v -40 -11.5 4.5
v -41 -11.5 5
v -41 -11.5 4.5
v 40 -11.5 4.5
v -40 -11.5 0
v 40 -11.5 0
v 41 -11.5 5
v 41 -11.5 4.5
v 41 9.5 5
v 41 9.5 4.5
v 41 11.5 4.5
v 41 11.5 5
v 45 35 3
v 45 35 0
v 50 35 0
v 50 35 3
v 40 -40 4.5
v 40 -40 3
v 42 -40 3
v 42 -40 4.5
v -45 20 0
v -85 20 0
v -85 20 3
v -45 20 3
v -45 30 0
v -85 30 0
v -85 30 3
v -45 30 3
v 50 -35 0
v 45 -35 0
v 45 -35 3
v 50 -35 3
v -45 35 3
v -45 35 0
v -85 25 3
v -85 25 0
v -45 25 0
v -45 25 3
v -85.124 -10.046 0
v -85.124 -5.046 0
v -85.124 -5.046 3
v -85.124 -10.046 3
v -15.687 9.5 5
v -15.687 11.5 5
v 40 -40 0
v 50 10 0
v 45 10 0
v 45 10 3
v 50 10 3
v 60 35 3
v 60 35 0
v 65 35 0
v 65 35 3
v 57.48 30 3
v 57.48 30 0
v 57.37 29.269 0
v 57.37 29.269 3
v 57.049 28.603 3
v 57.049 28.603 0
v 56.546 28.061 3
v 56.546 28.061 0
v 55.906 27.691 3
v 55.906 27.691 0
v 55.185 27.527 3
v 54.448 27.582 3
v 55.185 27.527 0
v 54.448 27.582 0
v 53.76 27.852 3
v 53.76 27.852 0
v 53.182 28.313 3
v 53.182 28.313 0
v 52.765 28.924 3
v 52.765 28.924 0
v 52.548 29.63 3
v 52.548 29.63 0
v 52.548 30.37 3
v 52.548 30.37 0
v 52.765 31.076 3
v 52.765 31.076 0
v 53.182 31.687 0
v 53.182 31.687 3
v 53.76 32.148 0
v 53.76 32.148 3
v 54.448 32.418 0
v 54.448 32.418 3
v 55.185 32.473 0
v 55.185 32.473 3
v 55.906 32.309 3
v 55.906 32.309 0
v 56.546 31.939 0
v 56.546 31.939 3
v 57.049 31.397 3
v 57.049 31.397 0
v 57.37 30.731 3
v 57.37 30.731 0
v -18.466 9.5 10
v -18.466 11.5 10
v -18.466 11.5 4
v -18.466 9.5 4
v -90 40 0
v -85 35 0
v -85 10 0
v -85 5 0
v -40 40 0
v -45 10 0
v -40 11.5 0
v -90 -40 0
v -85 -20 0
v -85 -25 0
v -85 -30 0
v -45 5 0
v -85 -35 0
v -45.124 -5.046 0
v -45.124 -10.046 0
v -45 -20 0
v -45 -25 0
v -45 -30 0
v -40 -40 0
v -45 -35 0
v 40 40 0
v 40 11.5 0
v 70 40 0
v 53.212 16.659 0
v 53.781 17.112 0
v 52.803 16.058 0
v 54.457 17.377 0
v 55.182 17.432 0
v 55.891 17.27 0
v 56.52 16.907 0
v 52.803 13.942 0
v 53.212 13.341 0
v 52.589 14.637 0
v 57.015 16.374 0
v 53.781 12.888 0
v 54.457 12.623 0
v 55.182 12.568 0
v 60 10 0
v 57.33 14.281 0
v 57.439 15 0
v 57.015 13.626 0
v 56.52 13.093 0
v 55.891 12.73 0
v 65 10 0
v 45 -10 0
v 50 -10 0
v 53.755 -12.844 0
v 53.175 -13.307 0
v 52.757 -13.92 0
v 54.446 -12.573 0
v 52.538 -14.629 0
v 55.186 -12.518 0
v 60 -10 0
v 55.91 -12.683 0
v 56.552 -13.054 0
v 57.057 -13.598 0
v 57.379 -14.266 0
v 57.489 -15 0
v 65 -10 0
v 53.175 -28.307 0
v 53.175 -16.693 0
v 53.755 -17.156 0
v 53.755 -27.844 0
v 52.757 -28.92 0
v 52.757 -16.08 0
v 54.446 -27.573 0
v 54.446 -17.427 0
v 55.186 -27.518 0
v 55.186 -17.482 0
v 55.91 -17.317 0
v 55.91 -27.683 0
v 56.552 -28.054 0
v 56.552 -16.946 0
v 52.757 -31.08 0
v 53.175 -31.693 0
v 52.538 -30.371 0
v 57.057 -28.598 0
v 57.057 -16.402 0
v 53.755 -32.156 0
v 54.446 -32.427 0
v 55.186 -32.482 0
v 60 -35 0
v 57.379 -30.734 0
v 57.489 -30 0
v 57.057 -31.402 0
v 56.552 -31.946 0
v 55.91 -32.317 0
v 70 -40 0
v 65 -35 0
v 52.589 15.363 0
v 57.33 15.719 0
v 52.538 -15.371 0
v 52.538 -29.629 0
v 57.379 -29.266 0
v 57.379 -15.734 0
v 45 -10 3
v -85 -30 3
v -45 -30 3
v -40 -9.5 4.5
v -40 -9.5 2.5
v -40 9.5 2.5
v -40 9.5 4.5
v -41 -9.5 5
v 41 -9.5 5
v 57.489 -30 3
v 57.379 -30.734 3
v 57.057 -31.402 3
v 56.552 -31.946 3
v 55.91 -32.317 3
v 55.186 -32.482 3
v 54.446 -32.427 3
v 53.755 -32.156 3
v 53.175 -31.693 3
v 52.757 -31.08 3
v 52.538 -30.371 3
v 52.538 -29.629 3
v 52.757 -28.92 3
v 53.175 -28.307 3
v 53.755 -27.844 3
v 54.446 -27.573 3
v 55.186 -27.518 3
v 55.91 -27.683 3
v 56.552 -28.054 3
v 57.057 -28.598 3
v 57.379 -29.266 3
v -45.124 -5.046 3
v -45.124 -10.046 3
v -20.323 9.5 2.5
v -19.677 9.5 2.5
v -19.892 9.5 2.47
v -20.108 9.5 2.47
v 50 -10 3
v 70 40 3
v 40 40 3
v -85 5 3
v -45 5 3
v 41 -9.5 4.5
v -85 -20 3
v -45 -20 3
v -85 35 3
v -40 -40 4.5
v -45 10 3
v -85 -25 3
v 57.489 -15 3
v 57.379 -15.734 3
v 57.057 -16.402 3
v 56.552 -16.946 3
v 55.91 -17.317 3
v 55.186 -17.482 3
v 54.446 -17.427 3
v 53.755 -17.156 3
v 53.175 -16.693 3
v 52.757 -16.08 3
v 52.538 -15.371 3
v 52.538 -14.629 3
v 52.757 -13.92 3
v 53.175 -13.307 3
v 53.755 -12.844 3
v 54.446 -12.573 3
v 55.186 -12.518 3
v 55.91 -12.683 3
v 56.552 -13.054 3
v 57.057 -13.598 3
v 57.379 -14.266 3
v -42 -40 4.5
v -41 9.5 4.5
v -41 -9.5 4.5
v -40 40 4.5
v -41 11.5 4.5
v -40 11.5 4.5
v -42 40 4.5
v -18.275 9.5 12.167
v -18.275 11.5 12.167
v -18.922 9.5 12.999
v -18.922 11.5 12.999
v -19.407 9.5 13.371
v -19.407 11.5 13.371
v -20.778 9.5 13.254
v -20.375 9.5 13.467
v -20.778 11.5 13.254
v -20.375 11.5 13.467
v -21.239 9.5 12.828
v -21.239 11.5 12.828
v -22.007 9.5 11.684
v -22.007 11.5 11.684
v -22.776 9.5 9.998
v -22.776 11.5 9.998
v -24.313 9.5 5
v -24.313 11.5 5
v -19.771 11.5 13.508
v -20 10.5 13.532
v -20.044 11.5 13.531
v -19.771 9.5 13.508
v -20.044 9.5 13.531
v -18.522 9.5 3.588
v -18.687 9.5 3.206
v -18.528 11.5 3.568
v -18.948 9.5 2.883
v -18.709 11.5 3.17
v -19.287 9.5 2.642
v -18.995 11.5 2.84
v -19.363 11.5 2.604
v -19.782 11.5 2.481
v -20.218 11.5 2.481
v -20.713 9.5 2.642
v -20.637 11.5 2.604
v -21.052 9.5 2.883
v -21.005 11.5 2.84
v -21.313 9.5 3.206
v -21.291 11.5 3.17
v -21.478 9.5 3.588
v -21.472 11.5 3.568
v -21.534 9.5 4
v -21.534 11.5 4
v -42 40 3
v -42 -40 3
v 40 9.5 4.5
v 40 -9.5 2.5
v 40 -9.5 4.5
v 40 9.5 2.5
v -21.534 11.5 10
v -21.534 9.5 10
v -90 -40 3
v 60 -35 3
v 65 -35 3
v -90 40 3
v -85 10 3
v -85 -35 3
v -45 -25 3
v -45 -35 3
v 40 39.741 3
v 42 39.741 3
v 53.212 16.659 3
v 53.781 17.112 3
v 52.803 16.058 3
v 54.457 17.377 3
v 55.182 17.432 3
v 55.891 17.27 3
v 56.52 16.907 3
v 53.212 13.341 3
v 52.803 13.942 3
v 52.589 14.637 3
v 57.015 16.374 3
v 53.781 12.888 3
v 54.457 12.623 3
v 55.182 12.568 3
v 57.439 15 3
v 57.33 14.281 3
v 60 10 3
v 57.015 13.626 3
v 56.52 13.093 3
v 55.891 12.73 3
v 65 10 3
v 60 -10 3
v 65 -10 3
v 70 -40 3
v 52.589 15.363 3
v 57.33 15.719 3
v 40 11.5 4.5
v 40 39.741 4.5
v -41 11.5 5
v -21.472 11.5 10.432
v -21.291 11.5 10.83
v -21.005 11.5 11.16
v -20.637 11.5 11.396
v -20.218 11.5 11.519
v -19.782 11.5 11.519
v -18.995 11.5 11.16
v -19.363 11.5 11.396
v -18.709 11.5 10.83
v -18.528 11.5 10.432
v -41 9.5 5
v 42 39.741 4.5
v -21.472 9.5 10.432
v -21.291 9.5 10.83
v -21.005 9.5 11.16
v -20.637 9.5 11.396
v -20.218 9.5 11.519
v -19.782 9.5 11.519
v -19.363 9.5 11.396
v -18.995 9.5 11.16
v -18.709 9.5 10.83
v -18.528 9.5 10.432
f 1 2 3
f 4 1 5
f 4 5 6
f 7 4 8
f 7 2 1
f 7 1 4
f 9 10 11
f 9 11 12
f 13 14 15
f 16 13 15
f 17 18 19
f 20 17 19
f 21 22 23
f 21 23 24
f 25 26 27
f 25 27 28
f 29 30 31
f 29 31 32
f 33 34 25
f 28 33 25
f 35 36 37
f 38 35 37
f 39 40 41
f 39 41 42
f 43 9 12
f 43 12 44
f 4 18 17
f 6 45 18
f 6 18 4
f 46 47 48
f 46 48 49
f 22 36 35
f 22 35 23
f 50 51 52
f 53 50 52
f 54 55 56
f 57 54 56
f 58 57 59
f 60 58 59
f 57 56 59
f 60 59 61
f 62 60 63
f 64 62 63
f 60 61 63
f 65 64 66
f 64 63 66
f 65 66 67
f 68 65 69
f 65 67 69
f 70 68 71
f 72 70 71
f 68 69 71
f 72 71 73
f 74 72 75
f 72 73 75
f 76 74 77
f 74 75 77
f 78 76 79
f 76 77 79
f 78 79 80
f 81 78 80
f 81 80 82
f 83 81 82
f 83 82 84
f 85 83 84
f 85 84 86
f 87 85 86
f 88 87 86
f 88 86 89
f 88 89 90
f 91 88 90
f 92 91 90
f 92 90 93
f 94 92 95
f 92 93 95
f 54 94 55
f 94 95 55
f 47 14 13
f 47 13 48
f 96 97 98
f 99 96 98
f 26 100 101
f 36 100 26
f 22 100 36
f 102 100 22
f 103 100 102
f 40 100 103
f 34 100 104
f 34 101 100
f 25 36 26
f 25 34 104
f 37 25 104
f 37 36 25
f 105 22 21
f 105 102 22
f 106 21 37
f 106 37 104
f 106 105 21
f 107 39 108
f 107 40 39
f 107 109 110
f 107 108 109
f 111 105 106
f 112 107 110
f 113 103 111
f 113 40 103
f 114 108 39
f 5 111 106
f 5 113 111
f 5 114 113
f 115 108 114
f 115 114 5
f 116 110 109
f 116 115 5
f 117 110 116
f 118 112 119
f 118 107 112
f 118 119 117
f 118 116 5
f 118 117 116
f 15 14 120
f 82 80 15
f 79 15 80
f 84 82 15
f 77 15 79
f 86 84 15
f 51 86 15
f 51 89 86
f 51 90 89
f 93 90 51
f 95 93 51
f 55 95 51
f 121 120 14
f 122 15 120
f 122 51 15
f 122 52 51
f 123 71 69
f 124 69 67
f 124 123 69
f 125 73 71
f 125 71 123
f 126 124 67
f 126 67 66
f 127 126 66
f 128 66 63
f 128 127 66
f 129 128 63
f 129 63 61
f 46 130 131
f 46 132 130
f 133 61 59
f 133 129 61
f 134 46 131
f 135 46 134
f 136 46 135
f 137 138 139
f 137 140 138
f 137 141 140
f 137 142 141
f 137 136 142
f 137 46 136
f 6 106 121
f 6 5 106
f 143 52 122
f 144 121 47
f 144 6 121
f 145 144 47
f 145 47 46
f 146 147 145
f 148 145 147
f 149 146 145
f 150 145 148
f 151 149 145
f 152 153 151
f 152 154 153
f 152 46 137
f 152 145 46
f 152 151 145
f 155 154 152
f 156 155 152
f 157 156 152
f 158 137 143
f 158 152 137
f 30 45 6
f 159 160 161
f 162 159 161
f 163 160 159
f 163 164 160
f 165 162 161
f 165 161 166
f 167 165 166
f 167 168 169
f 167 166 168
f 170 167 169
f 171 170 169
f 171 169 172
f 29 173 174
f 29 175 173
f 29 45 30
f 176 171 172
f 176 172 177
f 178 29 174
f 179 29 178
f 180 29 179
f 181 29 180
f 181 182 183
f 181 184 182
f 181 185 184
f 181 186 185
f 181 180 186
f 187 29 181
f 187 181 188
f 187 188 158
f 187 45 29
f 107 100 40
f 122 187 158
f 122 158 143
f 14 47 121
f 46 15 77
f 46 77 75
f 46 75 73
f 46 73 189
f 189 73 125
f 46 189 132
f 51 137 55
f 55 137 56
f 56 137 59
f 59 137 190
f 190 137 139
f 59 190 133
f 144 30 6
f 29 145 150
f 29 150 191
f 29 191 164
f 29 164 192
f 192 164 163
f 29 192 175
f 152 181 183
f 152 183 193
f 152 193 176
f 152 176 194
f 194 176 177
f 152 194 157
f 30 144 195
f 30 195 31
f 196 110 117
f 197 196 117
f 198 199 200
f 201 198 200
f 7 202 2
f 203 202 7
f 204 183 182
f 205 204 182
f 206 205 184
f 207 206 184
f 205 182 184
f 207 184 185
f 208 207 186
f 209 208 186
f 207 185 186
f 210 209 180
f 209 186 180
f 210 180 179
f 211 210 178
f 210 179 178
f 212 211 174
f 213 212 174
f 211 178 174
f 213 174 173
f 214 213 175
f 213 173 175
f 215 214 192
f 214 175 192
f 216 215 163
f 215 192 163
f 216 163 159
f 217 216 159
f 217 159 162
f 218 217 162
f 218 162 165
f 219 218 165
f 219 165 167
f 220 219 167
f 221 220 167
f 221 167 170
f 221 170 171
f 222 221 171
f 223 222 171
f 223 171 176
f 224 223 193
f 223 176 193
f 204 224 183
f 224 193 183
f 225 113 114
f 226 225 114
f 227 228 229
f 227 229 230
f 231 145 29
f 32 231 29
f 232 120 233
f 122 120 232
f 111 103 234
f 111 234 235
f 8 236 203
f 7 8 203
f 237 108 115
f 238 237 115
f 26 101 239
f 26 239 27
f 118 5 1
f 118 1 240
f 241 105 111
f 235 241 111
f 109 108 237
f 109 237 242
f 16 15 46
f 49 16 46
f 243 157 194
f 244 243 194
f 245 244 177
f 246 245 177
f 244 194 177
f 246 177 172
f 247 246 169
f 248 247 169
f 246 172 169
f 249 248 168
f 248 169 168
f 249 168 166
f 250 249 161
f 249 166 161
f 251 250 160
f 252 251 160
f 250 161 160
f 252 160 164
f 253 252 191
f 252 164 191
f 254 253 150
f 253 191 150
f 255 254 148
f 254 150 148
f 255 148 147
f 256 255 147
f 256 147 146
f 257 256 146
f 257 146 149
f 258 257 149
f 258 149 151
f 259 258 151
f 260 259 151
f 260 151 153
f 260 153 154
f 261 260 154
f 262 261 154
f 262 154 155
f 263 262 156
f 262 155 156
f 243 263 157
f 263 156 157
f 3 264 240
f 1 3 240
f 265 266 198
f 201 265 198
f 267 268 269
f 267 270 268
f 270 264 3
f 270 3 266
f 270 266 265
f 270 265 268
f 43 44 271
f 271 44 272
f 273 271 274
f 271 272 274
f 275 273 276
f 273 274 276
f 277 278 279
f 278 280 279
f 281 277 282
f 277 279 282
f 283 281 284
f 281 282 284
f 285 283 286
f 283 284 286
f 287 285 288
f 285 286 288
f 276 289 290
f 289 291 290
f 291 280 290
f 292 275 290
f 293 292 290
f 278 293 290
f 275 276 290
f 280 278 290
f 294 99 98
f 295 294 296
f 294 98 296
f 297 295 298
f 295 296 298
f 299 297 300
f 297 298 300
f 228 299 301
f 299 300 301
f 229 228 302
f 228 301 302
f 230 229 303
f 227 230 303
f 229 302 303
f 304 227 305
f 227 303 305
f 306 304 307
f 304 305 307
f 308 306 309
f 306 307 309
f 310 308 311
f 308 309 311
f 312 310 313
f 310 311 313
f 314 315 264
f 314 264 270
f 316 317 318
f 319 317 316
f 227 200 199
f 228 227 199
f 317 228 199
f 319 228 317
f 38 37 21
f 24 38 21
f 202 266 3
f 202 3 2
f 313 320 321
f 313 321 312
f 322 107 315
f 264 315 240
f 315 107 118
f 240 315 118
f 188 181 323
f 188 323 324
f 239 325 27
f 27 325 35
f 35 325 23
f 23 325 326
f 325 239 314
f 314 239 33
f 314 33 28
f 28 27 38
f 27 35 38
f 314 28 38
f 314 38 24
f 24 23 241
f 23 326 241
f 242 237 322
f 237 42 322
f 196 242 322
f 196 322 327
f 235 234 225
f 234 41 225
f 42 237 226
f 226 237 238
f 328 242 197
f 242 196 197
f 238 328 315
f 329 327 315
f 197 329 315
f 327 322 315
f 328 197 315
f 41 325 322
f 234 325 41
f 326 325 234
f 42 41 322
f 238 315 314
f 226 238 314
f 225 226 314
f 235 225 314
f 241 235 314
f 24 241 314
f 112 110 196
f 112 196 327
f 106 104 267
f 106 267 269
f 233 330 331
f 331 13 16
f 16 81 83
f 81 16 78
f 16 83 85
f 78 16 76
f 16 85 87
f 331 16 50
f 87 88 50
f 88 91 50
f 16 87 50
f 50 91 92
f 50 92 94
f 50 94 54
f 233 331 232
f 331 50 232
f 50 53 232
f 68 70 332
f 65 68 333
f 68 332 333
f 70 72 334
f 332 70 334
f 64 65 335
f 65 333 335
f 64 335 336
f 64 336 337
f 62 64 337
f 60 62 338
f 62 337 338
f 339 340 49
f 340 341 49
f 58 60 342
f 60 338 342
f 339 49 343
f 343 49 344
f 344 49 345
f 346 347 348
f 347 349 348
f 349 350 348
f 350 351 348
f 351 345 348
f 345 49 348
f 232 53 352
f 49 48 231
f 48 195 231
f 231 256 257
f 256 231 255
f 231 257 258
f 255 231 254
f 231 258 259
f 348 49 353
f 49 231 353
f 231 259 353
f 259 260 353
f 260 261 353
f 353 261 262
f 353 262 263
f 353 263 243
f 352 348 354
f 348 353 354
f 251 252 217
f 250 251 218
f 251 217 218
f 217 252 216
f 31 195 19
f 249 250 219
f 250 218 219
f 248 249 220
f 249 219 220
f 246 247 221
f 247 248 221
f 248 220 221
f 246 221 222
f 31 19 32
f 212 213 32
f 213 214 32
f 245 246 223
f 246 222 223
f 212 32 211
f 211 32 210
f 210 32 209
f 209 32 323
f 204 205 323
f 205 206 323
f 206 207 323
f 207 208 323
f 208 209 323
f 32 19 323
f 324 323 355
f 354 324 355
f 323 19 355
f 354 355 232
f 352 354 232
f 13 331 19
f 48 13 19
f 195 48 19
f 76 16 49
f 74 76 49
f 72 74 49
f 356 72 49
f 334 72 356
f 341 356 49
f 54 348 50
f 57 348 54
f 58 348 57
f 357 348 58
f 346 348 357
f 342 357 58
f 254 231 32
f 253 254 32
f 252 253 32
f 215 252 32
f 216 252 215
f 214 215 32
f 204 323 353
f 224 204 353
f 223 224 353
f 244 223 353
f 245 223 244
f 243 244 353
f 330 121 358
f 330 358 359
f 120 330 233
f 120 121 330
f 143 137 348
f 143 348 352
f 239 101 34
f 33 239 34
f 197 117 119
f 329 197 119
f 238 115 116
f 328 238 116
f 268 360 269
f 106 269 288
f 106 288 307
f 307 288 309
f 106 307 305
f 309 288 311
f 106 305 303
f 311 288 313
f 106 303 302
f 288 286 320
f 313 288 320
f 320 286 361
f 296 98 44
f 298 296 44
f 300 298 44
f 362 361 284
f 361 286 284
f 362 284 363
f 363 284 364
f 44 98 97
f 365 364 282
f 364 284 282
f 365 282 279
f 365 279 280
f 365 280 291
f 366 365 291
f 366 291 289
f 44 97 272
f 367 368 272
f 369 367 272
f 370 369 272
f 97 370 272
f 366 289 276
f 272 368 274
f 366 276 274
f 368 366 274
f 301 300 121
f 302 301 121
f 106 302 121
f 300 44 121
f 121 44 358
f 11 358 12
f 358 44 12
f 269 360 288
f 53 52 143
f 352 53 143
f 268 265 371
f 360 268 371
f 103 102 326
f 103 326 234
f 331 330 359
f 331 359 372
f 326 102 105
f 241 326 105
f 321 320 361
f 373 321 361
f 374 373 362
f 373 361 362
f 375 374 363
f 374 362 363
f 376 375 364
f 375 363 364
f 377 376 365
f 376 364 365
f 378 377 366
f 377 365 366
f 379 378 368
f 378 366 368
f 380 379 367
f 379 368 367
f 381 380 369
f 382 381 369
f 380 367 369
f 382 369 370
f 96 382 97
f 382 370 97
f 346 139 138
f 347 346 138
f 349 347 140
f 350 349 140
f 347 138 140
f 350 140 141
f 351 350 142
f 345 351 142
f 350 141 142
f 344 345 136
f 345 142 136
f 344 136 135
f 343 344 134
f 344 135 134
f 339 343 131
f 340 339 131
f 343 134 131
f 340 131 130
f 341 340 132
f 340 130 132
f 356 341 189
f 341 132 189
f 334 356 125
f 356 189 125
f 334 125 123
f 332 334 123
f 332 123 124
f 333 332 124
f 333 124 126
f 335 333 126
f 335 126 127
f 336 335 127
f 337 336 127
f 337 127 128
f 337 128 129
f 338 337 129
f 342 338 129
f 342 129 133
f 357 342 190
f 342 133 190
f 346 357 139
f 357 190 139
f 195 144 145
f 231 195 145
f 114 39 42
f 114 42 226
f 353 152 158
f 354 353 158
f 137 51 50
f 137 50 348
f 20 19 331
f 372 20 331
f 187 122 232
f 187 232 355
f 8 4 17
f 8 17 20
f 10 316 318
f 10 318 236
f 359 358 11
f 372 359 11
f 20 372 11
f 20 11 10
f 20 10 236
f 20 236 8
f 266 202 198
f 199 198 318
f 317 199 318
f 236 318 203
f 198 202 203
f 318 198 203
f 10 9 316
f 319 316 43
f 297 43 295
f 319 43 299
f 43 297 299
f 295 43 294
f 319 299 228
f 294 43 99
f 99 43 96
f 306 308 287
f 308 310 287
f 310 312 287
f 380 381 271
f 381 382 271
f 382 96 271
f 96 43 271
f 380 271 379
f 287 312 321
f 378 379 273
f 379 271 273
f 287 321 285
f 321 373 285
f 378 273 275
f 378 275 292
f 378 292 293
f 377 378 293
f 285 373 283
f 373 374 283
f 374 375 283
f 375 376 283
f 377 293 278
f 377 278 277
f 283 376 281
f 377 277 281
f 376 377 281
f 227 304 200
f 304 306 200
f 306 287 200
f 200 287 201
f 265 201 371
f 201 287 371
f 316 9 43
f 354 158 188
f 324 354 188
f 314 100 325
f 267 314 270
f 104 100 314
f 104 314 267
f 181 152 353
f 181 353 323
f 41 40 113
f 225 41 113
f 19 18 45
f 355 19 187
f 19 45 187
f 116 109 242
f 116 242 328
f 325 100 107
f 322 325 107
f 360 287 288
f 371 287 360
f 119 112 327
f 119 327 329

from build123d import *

# Parameters (mm, degrees)
SKETCH_W        = 81
SKETCH_H        = 19
PAD_DEPTH       = 2.5
SKETCH001_W     = 82
SKETCH001_H     = 5
PAD001_DEPTH    = 2
SKETCH002_W     = 82
SKETCH002_H     = 5
PAD002_DEPTH    = 2
PAD003_DEPTH    = 2
POCKET_DEPTH    = 2
SKETCH005_W     = 50
SKETCH005_H     = 80
SKETCH005_W_2   = 30
PAD004_DEPTH    = 3
SKETCH006_R     = 2.48011
SKETCH006_R_2   = 2.438602
SKETCH006_R_3   = 2.48946
SKETCH006_W     = 5
SKETCH006_H     = 25
POCKET001_DEPTH = 3
SKETCH007_W     = 40
SKETCH007_H     = 5
POCKET002_DEPTH = 5
SKETCH008_W     = 2
SKETCH008_H     = 79.741493
SKETCH008_H_2   = 80
PAD005_DEPTH    = 1.5


with BuildPart() as part:
    # Sketch → Pad (new body)
    with BuildSketch(Plane.XY):
        Rectangle(SKETCH_W, SKETCH_H)
    extrude(amount=PAD_DEPTH)

    # Sketch001 (on Face3 of Pad) → Pad001 (join)
    with BuildSketch(Plane.XZ.offset(9.5)):
        with Locations((0, 2.5)):
            Rectangle(SKETCH001_W, SKETCH001_H)
    extrude(amount=PAD001_DEPTH)

    # Sketch002 (on Face11 of Pad001) → Pad002 (join)
    with BuildSketch(Plane(origin=(0, 9.5, 0), x_dir=(-1, 0, 0), z_dir=(0, 1, 0))):
        with Locations((0, 2.5)):
            Rectangle(SKETCH002_W, SKETCH002_H)
    extrude(amount=PAD002_DEPTH)

    # Sketch003 (on Face6 of Pad002) → Pad003 (join)
    with BuildSketch(Plane(origin=(0, 11.5, 0), x_dir=(-1, 0, 0), z_dir=(0, 1, 0))):
        with BuildLine():
            add(Edge.make_bspline(
                [(15, 2.06384), (20, 25), (25, 2.06384)],
                knots=[0, 0, 0, 1, 1, 1], degree=2))
            Line((25, 2.06384), (15, 2.06384))
        make_face()
    extrude(amount=-PAD003_DEPTH)

    # Sketch004 (on Face22 of Pad003) → Pocket (cut)
    with BuildSketch(Plane(origin=(0, 11.5, 0), x_dir=(-1, 0, 0), z_dir=(0, 1, 0))):
        with BuildLine():
            ThreePointArc((21.534306, 9.999999), (20, 11.534305), (18.465694, 9.999999))
            Line((18.465694, 9.999999), (18.465694, 3.999999))
            ThreePointArc((18.465694, 3.999999), (20, 2.465693), (21.534306, 3.999999))
            Line((21.534306, 9.999999), (21.534306, 3.999999))
        make_face()
    extrude(amount=-POCKET_DEPTH, mode=Mode.SUBTRACT)

    # Sketch005 (on Face5 of Pocket) → Pad004 (join)
    with BuildSketch(Plane(origin=(0, 0, 0), x_dir=(1, 0, 0), z_dir=(0, 0, -1))):
        with Locations((-65, 0)):
            Rectangle(SKETCH005_W, SKETCH005_H)
        with Locations((55, 0)):
            Rectangle(SKETCH005_W_2, SKETCH005_H)
    extrude(amount=-PAD004_DEPTH)

    # Sketch006 (on Face18 of Pad004) → Pocket001 (cut)
    with BuildSketch(Plane(origin=(0, 0, 0), x_dir=(1, 0, 0), z_dir=(0, 0, -1))):
        with Locations((55, -30)):
            Circle(SKETCH006_R)
        with Locations((55, -15)):
            Circle(SKETCH006_R_2)
        with Locations((55, 15)):
            Circle(SKETCH006_R_3)
        with Locations((55, 30)):
            Circle(SKETCH006_R_3)
        with Locations((62.5, 22.5)):
            Rectangle(SKETCH006_W, SKETCH006_H)
        with Locations((62.5, -22.5)):
            Rectangle(SKETCH006_W, SKETCH006_H)
        with Locations((47.5, -22.5)):
            Rectangle(SKETCH006_W, SKETCH006_H)
        with Locations((47.5, 22.5)):
            Rectangle(SKETCH006_W, SKETCH006_H)
    extrude(amount=-POCKET001_DEPTH, mode=Mode.SUBTRACT)

    # Sketch007 (on Face2 of Pocket001) → Pocket002 (cut)
    with BuildSketch(Plane(origin=(0, 0, 0), x_dir=(1, 0, 0), z_dir=(0, 0, -1))):
        with Locations((-65, 32.5)):
            Rectangle(SKETCH007_W, SKETCH007_H)
        with Locations((-65, 22.5)):
            Rectangle(SKETCH007_W, SKETCH007_H)
        with Locations((-65.12384, 7.546442)):
            Rectangle(SKETCH007_W, SKETCH007_H)
        with Locations((-65, -7.5)):
            Rectangle(SKETCH007_W, SKETCH007_H)
        with Locations((-65, -22.5)):
            Rectangle(SKETCH007_W, SKETCH007_H)
        with Locations((-65, -32.5)):
            Rectangle(SKETCH007_W, SKETCH007_H)
    extrude(amount=-POCKET002_DEPTH, mode=Mode.SUBTRACT)

    # Sketch008 (on Face47 of Pocket002) → Pad005 (join)
    with BuildSketch(Plane.XY.offset(3)):
        with Locations((41, -0.129254)):
            Rectangle(SKETCH008_W, SKETCH008_H)
        with Locations((-41, 0)):
            Rectangle(SKETCH008_W, SKETCH008_H_2)
    extrude(amount=PAD005_DEPTH)


solid = part.part
